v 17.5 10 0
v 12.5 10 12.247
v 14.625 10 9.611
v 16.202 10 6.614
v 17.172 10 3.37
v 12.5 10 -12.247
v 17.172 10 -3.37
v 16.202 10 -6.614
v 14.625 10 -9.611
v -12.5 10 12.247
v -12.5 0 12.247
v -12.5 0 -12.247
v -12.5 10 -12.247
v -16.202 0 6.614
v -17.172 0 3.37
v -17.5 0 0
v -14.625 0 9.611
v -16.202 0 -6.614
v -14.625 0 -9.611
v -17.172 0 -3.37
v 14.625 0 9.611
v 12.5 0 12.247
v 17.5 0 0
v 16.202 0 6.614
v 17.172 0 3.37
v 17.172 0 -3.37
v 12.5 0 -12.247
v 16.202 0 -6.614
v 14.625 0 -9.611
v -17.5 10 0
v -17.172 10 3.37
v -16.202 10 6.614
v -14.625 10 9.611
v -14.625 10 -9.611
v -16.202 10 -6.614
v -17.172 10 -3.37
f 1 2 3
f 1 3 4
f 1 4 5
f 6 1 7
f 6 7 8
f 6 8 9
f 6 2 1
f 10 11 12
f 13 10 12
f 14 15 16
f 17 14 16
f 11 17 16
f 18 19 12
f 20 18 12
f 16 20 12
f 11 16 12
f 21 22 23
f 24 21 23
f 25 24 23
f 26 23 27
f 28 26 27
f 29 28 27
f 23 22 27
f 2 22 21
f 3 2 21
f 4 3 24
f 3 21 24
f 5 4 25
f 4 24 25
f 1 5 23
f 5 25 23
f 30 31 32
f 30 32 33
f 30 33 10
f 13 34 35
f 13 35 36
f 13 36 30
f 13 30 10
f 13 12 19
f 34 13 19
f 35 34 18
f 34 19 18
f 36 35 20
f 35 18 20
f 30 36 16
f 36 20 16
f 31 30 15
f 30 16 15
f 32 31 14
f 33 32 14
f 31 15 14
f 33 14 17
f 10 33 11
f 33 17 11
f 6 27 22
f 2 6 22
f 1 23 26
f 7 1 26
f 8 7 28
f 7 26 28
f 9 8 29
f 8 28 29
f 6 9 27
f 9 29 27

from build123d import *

# Parameters (mm, degrees)
BOSS_EXTRUDE1_DEPTH = 10


with BuildPart() as part:
    # Sketch2 → Boss-Extrude1 (new body)
    with BuildSketch(Plane(origin=(0, 0, 0), x_dir=(1, 0, 0), z_dir=(0, 1, 0))):
        with BuildLine():
            Line((-12.5, 9.987492178), (-12.5, 12.247448714))
            ThreePointArc((-12.5, 12.247448714), (-17.5, 0), (-12.5, -12.247448714))
            Line((-12.5, -12.247448714), (-12.5, -9.987492178))
            ThreePointArc((-12.5, -9.987492178), (-14.92684663, -5.76101117), (-15.968719423, -1))
            ThreePointArc((-15.968719423, -1), (-16, 0), (-15.968719423, 1))
            ThreePointArc((-15.968719423, 1), (-14.92684663, 5.76101117), (-12.5, 9.987492178))
        make_face()
        with BuildLine():
            Line((-12.5, 1), (-12.5, 9.987492178))
            ThreePointArc((-12.5, 9.987492178), (-14.92684663, 5.76101117), (-15.968719423, 1))
            Line((-15.968719423, 1), (-12.5, 1))
        make_face()
        with BuildLine():
            ThreePointArc((-15.968719423, -1), (-14.92684663, -5.76101117), (-12.5, -9.987492178))
            Line((-12.5, -9.987492178), (-12.5, -1))
            Line((-12.5, -1), (-15.968719423, -1))
        make_face()
        with BuildLine():
            Line((-12.5, -1), (-12.5, 1))
            Line((-12.5, 1), (-15.968719423, 1))
            ThreePointArc((-15.968719423, 1), (-16, 0), (-15.968719423, -1))
            Line((-15.968719423, -1), (-12.5, -1))
        make_face()
        with BuildLine():
            ThreePointArc((17.5, 0), (16.201851746, 6.614378278), (12.5, 12.247448714))
            Line((12.5, 12.247448714), (12.5, 9.987492178))
            ThreePointArc((12.5, 9.987492178), (14.92684663, 5.76101117), (15.968719423, 1))
            ThreePointArc((15.968719423, 1), (15.992177944, 0.500244559), (16, 0))
            ThreePointArc((16, 0), (15.992177944, -0.500244559), (15.968719423, -1))
            ThreePointArc((15.968719423, -1), (14.92684663, -5.76101117), (12.5, -9.987492178))
            Line((12.5, -9.987492178), (12.5, -12.247448714))
            ThreePointArc((12.5, -12.247448714), (16.201851746, -6.614378278), (17.5, 0))
        make_face()
        with BuildLine():
            ThreePointArc((15.968719423, 1), (14.92684663, 5.76101117), (12.5, 9.987492178))
            Line((12.5, 9.987492178), (12.5, 1))
            Line((12.5, 1), (15.968719423, 1))
        make_face()
        with BuildLine():
            Line((15.968719423, 1), (12.5, 1))
            Line((12.5, 1), (12.5, -1))
            Line((12.5, -1), (15.968719423, -1))
            ThreePointArc((15.968719423, -1), (15.992177944, -0.500244559), (16, 0))
            ThreePointArc((16, 0), (15.992177944, 0.500244559), (15.968719423, 1))
        make_face()
        with BuildLine():
            Line((12.5, -1), (12.5, -9.987492178))
            ThreePointArc((12.5, -9.987492178), (14.92684663, -5.76101117), (15.968719423, -1))
            Line((15.968719423, -1), (12.5, -1))
        make_face()
    extrude(amount=BOSS_EXTRUDE1_DEPTH)


solid = part.part
